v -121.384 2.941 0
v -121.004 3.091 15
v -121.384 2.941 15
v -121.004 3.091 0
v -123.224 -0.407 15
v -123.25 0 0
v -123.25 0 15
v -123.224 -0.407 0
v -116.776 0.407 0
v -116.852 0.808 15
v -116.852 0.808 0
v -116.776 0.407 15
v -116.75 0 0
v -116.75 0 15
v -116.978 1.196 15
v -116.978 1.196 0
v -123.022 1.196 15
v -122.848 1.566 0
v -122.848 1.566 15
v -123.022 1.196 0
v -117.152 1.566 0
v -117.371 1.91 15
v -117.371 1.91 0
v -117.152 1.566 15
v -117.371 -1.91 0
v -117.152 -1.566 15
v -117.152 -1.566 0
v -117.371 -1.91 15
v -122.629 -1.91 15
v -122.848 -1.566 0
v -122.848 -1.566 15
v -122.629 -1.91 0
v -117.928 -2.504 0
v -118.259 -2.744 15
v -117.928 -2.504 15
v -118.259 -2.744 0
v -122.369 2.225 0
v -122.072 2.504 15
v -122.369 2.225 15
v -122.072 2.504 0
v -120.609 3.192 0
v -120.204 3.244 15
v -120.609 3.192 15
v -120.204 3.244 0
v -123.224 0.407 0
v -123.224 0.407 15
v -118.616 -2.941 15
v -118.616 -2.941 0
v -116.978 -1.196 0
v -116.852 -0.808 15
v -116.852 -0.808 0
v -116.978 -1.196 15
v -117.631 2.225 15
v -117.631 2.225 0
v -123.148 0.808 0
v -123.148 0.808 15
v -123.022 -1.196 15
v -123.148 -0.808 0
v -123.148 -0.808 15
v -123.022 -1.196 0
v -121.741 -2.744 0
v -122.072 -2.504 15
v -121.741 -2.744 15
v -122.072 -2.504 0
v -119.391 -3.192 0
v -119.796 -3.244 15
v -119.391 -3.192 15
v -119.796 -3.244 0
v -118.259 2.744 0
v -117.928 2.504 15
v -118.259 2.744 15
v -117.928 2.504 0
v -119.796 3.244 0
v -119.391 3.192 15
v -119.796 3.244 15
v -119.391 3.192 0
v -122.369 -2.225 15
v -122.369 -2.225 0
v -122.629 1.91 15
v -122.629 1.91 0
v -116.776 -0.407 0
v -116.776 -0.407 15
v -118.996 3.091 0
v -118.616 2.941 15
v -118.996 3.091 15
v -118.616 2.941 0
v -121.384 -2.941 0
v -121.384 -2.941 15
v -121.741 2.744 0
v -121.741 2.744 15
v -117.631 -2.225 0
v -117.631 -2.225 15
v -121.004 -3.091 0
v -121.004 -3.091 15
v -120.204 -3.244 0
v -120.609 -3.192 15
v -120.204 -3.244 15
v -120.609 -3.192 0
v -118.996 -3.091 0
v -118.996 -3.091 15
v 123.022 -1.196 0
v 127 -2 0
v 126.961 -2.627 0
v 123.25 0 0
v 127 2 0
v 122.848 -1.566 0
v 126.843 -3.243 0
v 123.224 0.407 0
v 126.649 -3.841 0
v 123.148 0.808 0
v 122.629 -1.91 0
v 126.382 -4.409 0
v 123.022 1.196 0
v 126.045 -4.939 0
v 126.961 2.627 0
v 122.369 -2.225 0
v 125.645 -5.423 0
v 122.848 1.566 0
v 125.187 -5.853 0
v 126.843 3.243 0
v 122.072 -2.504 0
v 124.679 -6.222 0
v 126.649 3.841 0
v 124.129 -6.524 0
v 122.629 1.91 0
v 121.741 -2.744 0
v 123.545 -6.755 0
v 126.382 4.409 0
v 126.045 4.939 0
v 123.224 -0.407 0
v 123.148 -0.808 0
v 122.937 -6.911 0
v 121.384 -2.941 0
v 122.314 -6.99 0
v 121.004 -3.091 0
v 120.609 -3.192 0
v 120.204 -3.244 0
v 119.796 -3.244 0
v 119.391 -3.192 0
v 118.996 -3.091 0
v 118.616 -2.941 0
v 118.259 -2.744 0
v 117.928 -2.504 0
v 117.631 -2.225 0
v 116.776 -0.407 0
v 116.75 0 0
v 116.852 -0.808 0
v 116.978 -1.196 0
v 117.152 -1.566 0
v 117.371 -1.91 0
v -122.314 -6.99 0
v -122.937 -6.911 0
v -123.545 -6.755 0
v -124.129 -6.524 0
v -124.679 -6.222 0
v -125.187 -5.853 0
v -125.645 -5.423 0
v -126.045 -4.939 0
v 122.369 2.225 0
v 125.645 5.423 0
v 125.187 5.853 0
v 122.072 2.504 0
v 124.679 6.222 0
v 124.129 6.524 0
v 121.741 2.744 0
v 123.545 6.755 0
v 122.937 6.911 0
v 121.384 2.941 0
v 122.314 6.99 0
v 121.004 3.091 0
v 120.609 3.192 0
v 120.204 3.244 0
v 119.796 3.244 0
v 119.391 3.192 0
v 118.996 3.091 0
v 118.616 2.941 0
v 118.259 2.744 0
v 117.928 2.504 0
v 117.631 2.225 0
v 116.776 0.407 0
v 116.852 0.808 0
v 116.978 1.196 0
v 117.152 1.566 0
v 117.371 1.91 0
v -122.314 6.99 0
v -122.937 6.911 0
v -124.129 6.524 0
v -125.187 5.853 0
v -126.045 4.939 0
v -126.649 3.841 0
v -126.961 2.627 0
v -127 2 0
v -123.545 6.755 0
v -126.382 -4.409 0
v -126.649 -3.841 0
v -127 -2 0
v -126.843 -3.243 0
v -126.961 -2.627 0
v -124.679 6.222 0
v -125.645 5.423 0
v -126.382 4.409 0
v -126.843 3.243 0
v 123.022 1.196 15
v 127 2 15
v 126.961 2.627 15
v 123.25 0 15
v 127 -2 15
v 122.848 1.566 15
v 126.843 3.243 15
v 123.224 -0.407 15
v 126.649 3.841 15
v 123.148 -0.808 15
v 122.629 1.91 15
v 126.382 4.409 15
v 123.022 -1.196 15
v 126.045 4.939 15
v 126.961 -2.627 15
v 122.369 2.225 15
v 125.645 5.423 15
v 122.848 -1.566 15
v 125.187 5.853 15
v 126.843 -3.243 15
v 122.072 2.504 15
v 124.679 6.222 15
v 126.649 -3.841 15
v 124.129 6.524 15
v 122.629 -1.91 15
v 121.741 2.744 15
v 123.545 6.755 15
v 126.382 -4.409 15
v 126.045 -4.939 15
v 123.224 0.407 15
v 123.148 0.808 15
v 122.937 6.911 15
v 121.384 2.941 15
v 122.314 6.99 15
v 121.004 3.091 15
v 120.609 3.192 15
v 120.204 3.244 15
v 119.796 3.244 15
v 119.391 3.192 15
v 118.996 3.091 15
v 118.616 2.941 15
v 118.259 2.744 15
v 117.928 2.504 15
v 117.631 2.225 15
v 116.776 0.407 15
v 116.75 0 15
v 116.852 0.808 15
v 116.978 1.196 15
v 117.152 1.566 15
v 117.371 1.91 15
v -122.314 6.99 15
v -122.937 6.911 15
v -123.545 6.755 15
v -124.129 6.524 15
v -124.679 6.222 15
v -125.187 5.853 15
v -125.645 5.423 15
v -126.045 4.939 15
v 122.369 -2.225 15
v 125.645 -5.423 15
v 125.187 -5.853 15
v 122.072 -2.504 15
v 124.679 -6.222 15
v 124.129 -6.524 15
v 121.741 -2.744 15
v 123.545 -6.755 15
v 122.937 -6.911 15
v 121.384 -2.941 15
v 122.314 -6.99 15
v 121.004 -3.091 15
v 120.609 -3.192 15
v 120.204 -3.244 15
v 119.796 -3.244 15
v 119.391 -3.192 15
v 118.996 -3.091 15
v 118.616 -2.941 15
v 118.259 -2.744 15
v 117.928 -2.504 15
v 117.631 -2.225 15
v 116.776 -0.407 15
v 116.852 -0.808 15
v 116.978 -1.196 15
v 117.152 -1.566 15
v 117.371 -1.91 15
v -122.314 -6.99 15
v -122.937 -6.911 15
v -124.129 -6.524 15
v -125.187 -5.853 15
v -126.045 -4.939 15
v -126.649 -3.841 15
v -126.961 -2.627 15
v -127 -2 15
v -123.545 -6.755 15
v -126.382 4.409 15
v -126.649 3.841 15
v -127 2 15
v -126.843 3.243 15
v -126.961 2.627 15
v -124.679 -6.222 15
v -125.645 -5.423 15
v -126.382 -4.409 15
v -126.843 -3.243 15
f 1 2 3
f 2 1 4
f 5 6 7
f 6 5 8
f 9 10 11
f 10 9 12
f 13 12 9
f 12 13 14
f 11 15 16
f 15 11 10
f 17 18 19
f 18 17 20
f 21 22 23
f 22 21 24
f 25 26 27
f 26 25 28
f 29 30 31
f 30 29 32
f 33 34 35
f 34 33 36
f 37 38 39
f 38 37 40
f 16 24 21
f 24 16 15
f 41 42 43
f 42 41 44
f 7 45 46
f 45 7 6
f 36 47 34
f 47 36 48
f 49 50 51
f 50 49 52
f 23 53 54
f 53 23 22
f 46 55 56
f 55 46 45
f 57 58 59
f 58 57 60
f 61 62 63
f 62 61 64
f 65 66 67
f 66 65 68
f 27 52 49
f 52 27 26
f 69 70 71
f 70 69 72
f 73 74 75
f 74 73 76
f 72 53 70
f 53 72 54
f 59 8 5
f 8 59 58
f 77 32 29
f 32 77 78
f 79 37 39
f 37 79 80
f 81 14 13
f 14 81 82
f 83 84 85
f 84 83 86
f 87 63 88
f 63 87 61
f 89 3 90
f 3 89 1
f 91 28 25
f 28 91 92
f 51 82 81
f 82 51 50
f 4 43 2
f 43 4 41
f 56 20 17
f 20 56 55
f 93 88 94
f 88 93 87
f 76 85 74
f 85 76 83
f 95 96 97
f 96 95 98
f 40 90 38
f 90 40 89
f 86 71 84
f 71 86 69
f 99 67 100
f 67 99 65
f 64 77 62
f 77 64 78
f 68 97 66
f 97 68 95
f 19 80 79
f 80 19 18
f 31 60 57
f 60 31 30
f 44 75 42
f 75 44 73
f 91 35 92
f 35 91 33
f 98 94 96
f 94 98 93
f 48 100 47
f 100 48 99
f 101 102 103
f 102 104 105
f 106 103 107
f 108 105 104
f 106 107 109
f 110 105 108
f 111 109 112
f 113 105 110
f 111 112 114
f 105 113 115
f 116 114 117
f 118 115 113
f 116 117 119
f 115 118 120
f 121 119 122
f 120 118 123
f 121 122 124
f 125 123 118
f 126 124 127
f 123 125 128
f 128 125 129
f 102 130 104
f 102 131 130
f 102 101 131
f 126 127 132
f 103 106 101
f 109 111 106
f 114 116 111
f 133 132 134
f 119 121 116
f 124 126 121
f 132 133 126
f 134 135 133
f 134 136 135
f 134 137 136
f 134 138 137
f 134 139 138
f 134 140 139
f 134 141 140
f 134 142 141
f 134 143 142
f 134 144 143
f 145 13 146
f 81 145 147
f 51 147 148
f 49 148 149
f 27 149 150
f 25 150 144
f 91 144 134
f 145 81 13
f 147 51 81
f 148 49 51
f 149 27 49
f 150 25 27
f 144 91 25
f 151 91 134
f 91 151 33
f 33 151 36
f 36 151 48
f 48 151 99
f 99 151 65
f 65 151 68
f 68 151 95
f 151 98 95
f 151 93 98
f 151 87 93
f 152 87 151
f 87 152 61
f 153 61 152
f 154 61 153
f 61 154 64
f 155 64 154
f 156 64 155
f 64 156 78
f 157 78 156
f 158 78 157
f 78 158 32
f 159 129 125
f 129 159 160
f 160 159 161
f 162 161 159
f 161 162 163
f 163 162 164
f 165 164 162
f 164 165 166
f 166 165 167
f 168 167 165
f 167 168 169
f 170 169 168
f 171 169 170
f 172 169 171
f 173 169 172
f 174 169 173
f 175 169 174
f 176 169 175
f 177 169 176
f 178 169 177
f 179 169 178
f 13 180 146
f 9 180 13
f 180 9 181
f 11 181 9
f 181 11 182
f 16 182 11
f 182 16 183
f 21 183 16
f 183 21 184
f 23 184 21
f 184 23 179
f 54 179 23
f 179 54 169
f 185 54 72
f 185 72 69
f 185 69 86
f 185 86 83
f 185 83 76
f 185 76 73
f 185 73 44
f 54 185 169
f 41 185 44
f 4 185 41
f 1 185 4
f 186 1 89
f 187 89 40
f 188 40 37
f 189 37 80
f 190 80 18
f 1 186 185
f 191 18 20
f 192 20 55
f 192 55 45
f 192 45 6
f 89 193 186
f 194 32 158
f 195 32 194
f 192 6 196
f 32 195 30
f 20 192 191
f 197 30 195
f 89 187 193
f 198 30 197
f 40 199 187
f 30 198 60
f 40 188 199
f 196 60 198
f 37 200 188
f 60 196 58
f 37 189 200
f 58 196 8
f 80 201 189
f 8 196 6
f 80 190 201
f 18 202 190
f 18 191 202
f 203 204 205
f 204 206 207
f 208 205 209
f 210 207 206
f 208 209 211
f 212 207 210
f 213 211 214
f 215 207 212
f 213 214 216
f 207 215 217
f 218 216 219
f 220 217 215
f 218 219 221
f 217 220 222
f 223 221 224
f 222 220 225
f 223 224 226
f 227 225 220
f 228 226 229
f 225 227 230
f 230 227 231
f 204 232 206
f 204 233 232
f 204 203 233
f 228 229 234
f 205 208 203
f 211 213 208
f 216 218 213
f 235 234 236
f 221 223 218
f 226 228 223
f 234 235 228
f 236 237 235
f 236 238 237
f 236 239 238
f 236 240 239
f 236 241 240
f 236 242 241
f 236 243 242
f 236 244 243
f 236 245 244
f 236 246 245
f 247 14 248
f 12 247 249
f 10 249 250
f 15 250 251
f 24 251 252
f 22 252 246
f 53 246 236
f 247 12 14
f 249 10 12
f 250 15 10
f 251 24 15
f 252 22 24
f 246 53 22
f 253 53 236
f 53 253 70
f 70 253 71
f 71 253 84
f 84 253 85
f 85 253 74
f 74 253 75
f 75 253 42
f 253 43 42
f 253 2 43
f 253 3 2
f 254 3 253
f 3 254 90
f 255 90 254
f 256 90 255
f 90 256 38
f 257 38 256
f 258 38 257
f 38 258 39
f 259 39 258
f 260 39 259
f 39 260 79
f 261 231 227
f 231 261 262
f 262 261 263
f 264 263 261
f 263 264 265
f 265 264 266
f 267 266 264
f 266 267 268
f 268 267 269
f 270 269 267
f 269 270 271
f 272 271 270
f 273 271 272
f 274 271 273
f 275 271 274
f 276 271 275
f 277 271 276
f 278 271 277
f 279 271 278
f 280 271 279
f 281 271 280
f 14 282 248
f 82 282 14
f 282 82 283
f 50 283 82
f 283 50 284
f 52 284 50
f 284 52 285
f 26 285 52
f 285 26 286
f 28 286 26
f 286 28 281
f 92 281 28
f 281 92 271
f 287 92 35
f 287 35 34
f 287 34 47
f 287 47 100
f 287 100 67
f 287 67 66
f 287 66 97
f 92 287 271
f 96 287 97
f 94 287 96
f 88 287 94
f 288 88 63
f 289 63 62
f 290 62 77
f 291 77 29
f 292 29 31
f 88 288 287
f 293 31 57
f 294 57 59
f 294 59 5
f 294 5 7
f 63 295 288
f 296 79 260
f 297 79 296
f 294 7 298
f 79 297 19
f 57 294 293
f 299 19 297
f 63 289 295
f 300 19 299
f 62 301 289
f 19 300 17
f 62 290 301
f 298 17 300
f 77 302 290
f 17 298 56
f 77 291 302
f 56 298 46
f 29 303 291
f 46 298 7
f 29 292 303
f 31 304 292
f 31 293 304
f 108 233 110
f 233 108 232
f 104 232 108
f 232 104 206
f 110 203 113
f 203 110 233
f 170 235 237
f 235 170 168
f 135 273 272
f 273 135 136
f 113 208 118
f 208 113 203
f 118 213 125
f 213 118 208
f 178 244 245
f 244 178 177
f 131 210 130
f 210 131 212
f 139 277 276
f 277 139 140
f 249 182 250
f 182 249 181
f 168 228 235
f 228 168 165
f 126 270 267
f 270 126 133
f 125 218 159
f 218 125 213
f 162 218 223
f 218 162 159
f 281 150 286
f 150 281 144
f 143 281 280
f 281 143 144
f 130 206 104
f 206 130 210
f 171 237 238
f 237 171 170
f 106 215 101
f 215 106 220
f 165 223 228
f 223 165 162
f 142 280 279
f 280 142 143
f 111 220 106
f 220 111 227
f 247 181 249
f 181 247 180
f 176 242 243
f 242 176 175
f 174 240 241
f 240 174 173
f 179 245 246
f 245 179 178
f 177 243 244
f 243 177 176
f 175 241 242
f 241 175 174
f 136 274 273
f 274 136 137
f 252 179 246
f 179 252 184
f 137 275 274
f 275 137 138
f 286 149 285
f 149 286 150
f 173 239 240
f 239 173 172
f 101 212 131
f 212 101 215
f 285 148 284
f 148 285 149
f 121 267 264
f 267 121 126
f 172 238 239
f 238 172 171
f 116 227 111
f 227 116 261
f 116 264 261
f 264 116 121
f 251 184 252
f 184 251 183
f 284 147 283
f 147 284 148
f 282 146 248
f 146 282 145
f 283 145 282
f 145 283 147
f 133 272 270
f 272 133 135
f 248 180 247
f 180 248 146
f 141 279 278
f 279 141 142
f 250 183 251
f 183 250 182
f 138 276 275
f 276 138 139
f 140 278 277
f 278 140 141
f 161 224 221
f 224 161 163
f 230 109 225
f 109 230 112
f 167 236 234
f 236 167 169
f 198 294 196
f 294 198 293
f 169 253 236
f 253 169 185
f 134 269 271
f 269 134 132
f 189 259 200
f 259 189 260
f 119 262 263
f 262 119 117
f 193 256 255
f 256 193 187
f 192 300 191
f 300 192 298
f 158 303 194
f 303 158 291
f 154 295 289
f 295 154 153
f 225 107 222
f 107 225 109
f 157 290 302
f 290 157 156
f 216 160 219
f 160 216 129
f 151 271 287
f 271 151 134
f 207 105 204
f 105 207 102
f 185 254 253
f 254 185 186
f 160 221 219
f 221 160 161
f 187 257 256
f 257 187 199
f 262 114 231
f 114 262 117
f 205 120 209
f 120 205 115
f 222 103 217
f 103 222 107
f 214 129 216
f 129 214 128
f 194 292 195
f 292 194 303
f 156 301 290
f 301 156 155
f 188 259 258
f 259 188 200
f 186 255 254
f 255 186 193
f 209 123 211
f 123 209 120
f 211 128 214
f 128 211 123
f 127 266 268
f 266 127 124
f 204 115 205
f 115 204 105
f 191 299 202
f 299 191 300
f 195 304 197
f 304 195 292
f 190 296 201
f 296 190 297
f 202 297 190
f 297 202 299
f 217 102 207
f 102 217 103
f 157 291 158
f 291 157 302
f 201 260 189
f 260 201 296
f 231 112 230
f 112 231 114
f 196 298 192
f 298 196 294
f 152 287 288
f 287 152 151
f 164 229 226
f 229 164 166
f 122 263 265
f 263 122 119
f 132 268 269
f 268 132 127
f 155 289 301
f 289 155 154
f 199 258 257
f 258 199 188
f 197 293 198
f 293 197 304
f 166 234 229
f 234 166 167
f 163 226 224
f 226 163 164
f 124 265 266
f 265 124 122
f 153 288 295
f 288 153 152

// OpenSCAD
$fn = 50;


difference() {
	union() {
		hull() {
			translate(v = [-122.0000000000, 2.0000000000, 0]) {
				cylinder(h = 15, r = 5);
			}
			translate(v = [122.0000000000, 2.0000000000, 0]) {
				cylinder(h = 15, r = 5);
			}
			translate(v = [-122.0000000000, -2.0000000000, 0]) {
				cylinder(h = 15, r = 5);
			}
			translate(v = [122.0000000000, -2.0000000000, 0]) {
				cylinder(h = 15, r = 5);
			}
		}
	}
	union() {
		translate(v = [-120.0000000000, 0.0000000000, 0]) {
			cylinder(h = 15, r = 3.2500000000);
		}
		translate(v = [120.0000000000, 0.0000000000, 0]) {
			cylinder(h = 15, r = 3.2500000000);
		}
		translate(v = [-120.0000000000, 0.0000000000, 0]) {
			cylinder(h = 15, r = 1.8000000000);
		}
		translate(v = [120.0000000000, 0.0000000000, 0]) {
			cylinder(h = 15, r = 1.8000000000);
		}
		translate(v = [-120.0000000000, 0.0000000000, 0]) {
			cylinder(h = 15, r = 1.8000000000);
		}
		translate(v = [120.0000000000, 0.0000000000, 0]) {
			cylinder(h = 15, r = 1.8000000000);
		}
		translate(v = [-120.0000000000, 0.0000000000, 0]) {
			cylinder(h = 15, r = 1.8000000000);
		}
		translate(v = [120.0000000000, 0.0000000000, 0]) {
			cylinder(h = 15, r = 1.8000000000);
		}
	}
}
